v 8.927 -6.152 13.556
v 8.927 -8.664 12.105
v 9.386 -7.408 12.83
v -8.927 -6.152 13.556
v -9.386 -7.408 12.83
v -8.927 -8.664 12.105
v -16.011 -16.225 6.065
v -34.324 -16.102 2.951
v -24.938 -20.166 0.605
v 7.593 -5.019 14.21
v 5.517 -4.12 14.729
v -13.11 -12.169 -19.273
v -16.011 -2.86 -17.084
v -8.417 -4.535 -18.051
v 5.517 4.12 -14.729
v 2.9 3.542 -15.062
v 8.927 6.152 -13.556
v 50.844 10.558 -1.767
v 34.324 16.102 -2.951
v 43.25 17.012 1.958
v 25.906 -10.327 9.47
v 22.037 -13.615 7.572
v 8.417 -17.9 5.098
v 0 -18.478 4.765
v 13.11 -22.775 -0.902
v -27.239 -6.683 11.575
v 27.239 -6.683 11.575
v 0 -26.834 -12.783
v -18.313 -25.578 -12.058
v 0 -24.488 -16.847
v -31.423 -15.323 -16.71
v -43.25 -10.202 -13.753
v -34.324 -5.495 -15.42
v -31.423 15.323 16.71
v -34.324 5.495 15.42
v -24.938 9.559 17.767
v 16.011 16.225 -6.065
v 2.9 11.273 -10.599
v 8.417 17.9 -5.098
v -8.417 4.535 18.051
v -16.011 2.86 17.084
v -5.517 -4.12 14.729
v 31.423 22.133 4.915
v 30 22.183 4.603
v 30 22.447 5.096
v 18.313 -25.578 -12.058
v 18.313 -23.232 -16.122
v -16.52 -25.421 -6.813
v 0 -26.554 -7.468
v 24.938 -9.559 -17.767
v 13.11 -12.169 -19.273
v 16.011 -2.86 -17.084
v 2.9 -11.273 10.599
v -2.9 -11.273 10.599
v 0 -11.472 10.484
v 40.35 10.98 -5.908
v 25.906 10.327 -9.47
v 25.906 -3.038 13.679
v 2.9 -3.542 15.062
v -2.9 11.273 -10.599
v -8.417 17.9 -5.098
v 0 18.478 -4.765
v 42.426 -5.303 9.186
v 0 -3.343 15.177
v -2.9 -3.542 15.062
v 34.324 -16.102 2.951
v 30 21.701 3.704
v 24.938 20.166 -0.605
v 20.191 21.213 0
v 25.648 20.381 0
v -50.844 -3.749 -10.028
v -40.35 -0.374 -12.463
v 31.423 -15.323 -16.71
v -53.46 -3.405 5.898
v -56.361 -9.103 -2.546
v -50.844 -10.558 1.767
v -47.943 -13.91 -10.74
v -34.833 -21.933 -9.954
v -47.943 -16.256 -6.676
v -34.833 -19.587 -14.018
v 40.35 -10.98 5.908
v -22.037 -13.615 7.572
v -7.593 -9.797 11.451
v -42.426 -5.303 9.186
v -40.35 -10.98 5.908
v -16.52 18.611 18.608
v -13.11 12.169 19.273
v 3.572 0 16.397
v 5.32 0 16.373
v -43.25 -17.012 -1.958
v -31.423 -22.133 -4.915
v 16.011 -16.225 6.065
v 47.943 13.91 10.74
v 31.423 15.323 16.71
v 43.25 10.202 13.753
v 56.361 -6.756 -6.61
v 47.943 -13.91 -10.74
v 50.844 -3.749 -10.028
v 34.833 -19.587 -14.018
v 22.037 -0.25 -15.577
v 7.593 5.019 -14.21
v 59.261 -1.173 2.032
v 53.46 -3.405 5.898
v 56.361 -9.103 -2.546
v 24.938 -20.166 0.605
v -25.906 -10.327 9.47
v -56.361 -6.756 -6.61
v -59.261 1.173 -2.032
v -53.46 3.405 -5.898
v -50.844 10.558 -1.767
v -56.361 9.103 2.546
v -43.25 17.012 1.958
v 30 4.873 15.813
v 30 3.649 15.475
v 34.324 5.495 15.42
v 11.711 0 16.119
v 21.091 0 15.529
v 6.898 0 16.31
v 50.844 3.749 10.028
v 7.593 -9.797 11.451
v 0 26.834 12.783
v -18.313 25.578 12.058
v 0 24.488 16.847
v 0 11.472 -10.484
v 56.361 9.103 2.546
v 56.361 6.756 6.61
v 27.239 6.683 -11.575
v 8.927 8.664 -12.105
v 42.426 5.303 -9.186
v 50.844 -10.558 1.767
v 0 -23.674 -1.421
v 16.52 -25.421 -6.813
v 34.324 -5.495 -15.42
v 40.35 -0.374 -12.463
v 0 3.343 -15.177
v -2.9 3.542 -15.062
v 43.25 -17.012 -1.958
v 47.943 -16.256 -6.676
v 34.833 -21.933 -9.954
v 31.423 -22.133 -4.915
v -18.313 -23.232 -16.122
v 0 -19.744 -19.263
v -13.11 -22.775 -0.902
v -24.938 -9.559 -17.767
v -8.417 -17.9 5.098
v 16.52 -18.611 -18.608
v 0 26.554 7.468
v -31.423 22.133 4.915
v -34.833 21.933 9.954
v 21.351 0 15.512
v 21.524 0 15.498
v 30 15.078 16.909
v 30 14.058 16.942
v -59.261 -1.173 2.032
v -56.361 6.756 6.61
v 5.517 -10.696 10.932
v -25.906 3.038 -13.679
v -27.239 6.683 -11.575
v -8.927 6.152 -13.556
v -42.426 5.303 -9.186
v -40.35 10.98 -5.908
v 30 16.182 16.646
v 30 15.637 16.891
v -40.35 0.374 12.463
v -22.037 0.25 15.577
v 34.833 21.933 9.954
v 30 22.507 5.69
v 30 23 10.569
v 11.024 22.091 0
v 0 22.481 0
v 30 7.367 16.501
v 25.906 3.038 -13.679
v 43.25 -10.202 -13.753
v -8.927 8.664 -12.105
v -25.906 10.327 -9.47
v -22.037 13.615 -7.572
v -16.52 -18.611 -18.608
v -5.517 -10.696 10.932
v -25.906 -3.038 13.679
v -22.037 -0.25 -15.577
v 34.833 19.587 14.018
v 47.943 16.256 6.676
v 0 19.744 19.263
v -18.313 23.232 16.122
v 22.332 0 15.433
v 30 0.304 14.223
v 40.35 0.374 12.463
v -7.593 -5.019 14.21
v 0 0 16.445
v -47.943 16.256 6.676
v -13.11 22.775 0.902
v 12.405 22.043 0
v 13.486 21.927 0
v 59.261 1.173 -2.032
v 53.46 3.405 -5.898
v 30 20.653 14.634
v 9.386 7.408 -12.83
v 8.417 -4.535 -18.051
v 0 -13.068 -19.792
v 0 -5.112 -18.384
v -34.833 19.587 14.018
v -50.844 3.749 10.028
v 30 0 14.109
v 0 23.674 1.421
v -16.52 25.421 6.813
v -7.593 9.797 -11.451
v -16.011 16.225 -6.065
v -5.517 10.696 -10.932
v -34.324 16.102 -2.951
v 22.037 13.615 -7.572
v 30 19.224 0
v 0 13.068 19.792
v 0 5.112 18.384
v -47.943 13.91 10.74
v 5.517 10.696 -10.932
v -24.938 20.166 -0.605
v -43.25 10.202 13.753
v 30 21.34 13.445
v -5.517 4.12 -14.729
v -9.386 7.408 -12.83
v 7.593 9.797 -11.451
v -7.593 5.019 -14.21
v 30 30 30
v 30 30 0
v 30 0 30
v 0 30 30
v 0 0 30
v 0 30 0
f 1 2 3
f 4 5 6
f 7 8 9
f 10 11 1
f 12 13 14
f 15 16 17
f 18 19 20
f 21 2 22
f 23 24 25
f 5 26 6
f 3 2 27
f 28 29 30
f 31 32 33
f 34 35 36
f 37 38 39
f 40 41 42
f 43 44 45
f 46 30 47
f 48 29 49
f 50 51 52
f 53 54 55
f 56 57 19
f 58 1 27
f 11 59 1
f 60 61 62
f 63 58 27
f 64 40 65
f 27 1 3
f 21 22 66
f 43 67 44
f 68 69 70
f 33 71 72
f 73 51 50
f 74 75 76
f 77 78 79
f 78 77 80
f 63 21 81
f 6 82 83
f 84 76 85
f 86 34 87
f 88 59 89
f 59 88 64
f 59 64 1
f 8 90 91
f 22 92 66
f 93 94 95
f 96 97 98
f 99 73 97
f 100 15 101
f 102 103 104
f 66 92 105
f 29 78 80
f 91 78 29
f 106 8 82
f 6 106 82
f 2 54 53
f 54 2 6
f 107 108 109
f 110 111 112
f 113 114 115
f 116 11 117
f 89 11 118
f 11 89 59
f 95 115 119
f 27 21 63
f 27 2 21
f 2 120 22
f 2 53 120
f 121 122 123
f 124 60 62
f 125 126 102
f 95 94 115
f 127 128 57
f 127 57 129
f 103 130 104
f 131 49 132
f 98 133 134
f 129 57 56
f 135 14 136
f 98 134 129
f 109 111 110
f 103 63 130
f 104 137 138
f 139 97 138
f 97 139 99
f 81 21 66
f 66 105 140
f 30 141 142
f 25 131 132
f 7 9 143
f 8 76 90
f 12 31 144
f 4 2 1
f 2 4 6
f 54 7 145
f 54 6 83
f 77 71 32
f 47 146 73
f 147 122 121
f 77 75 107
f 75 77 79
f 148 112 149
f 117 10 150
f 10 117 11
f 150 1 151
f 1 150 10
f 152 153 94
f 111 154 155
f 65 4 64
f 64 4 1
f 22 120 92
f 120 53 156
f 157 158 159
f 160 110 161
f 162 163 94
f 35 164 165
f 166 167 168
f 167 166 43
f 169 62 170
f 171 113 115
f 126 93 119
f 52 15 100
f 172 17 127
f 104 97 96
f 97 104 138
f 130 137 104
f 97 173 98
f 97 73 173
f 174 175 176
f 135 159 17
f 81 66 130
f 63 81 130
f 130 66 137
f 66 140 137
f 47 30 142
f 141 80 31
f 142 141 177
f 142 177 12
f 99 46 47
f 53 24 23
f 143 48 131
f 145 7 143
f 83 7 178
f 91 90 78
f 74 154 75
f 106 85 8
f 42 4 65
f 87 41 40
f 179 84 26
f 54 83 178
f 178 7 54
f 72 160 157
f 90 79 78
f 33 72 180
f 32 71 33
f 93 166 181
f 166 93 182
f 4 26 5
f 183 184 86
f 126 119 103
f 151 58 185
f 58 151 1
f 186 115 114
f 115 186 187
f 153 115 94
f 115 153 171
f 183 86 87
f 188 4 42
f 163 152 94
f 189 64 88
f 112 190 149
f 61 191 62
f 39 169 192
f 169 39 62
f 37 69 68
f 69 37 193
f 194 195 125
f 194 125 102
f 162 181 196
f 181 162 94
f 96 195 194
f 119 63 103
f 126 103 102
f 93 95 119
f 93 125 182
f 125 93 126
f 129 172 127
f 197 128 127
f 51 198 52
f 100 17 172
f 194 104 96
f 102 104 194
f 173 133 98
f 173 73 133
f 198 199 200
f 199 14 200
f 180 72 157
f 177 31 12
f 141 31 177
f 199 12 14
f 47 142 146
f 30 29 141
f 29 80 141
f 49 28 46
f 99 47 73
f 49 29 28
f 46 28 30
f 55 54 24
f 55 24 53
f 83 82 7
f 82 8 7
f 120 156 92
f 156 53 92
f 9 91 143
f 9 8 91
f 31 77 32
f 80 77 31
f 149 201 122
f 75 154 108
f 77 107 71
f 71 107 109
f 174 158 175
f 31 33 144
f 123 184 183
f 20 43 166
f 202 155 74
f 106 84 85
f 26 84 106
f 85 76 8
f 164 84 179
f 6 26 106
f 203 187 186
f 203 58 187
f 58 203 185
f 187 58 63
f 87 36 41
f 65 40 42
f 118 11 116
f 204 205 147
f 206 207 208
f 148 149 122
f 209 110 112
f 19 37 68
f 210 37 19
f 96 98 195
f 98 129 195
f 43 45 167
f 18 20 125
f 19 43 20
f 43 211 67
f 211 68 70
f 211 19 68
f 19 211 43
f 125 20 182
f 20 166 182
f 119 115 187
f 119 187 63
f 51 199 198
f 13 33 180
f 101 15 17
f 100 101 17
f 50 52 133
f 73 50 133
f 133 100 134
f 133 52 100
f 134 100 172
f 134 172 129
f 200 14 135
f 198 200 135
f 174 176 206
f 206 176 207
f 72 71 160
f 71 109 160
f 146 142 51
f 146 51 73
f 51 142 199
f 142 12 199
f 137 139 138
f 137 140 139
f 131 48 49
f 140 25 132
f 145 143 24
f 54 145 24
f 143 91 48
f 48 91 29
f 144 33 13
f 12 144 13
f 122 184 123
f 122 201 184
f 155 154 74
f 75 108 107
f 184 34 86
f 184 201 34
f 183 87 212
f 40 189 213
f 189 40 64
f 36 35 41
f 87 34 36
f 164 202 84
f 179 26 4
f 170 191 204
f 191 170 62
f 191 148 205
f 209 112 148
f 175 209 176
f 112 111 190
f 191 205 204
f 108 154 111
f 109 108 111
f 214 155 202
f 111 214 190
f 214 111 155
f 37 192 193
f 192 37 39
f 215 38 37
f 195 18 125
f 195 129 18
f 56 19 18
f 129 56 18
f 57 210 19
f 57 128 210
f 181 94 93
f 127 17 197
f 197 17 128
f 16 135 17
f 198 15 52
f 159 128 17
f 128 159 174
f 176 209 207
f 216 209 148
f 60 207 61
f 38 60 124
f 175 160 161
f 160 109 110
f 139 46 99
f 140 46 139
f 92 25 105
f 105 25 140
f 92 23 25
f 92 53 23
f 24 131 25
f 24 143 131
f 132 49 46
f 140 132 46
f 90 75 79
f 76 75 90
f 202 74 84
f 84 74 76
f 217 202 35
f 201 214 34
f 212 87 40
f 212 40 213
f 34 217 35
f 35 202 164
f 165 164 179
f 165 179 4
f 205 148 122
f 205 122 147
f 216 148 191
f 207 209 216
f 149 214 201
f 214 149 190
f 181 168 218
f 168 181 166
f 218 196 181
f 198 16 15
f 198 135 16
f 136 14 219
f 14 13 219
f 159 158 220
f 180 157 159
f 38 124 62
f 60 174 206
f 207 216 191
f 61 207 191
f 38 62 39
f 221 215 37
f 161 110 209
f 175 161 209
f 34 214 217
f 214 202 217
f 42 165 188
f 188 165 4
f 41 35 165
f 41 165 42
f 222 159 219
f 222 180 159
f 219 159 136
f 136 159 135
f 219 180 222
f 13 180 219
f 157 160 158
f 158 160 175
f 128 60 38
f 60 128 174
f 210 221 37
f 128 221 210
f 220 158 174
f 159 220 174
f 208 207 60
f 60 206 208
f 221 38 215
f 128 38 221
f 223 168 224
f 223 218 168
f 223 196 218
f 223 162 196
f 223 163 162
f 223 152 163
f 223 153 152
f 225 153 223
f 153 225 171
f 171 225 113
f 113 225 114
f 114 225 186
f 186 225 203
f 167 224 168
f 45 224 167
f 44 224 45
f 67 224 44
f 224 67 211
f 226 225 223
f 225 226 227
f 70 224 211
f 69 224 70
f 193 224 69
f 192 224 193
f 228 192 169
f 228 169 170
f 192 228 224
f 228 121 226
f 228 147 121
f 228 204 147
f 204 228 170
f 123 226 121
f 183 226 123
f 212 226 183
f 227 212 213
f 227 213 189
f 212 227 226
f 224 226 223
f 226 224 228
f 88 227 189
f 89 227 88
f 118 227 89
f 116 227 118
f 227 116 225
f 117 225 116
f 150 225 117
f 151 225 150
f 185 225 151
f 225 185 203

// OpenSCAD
scale(3) {
rotate([30,0,0])
scale([2,1,0.5])
sphere(10, $fn=20);
cube(10);
}
